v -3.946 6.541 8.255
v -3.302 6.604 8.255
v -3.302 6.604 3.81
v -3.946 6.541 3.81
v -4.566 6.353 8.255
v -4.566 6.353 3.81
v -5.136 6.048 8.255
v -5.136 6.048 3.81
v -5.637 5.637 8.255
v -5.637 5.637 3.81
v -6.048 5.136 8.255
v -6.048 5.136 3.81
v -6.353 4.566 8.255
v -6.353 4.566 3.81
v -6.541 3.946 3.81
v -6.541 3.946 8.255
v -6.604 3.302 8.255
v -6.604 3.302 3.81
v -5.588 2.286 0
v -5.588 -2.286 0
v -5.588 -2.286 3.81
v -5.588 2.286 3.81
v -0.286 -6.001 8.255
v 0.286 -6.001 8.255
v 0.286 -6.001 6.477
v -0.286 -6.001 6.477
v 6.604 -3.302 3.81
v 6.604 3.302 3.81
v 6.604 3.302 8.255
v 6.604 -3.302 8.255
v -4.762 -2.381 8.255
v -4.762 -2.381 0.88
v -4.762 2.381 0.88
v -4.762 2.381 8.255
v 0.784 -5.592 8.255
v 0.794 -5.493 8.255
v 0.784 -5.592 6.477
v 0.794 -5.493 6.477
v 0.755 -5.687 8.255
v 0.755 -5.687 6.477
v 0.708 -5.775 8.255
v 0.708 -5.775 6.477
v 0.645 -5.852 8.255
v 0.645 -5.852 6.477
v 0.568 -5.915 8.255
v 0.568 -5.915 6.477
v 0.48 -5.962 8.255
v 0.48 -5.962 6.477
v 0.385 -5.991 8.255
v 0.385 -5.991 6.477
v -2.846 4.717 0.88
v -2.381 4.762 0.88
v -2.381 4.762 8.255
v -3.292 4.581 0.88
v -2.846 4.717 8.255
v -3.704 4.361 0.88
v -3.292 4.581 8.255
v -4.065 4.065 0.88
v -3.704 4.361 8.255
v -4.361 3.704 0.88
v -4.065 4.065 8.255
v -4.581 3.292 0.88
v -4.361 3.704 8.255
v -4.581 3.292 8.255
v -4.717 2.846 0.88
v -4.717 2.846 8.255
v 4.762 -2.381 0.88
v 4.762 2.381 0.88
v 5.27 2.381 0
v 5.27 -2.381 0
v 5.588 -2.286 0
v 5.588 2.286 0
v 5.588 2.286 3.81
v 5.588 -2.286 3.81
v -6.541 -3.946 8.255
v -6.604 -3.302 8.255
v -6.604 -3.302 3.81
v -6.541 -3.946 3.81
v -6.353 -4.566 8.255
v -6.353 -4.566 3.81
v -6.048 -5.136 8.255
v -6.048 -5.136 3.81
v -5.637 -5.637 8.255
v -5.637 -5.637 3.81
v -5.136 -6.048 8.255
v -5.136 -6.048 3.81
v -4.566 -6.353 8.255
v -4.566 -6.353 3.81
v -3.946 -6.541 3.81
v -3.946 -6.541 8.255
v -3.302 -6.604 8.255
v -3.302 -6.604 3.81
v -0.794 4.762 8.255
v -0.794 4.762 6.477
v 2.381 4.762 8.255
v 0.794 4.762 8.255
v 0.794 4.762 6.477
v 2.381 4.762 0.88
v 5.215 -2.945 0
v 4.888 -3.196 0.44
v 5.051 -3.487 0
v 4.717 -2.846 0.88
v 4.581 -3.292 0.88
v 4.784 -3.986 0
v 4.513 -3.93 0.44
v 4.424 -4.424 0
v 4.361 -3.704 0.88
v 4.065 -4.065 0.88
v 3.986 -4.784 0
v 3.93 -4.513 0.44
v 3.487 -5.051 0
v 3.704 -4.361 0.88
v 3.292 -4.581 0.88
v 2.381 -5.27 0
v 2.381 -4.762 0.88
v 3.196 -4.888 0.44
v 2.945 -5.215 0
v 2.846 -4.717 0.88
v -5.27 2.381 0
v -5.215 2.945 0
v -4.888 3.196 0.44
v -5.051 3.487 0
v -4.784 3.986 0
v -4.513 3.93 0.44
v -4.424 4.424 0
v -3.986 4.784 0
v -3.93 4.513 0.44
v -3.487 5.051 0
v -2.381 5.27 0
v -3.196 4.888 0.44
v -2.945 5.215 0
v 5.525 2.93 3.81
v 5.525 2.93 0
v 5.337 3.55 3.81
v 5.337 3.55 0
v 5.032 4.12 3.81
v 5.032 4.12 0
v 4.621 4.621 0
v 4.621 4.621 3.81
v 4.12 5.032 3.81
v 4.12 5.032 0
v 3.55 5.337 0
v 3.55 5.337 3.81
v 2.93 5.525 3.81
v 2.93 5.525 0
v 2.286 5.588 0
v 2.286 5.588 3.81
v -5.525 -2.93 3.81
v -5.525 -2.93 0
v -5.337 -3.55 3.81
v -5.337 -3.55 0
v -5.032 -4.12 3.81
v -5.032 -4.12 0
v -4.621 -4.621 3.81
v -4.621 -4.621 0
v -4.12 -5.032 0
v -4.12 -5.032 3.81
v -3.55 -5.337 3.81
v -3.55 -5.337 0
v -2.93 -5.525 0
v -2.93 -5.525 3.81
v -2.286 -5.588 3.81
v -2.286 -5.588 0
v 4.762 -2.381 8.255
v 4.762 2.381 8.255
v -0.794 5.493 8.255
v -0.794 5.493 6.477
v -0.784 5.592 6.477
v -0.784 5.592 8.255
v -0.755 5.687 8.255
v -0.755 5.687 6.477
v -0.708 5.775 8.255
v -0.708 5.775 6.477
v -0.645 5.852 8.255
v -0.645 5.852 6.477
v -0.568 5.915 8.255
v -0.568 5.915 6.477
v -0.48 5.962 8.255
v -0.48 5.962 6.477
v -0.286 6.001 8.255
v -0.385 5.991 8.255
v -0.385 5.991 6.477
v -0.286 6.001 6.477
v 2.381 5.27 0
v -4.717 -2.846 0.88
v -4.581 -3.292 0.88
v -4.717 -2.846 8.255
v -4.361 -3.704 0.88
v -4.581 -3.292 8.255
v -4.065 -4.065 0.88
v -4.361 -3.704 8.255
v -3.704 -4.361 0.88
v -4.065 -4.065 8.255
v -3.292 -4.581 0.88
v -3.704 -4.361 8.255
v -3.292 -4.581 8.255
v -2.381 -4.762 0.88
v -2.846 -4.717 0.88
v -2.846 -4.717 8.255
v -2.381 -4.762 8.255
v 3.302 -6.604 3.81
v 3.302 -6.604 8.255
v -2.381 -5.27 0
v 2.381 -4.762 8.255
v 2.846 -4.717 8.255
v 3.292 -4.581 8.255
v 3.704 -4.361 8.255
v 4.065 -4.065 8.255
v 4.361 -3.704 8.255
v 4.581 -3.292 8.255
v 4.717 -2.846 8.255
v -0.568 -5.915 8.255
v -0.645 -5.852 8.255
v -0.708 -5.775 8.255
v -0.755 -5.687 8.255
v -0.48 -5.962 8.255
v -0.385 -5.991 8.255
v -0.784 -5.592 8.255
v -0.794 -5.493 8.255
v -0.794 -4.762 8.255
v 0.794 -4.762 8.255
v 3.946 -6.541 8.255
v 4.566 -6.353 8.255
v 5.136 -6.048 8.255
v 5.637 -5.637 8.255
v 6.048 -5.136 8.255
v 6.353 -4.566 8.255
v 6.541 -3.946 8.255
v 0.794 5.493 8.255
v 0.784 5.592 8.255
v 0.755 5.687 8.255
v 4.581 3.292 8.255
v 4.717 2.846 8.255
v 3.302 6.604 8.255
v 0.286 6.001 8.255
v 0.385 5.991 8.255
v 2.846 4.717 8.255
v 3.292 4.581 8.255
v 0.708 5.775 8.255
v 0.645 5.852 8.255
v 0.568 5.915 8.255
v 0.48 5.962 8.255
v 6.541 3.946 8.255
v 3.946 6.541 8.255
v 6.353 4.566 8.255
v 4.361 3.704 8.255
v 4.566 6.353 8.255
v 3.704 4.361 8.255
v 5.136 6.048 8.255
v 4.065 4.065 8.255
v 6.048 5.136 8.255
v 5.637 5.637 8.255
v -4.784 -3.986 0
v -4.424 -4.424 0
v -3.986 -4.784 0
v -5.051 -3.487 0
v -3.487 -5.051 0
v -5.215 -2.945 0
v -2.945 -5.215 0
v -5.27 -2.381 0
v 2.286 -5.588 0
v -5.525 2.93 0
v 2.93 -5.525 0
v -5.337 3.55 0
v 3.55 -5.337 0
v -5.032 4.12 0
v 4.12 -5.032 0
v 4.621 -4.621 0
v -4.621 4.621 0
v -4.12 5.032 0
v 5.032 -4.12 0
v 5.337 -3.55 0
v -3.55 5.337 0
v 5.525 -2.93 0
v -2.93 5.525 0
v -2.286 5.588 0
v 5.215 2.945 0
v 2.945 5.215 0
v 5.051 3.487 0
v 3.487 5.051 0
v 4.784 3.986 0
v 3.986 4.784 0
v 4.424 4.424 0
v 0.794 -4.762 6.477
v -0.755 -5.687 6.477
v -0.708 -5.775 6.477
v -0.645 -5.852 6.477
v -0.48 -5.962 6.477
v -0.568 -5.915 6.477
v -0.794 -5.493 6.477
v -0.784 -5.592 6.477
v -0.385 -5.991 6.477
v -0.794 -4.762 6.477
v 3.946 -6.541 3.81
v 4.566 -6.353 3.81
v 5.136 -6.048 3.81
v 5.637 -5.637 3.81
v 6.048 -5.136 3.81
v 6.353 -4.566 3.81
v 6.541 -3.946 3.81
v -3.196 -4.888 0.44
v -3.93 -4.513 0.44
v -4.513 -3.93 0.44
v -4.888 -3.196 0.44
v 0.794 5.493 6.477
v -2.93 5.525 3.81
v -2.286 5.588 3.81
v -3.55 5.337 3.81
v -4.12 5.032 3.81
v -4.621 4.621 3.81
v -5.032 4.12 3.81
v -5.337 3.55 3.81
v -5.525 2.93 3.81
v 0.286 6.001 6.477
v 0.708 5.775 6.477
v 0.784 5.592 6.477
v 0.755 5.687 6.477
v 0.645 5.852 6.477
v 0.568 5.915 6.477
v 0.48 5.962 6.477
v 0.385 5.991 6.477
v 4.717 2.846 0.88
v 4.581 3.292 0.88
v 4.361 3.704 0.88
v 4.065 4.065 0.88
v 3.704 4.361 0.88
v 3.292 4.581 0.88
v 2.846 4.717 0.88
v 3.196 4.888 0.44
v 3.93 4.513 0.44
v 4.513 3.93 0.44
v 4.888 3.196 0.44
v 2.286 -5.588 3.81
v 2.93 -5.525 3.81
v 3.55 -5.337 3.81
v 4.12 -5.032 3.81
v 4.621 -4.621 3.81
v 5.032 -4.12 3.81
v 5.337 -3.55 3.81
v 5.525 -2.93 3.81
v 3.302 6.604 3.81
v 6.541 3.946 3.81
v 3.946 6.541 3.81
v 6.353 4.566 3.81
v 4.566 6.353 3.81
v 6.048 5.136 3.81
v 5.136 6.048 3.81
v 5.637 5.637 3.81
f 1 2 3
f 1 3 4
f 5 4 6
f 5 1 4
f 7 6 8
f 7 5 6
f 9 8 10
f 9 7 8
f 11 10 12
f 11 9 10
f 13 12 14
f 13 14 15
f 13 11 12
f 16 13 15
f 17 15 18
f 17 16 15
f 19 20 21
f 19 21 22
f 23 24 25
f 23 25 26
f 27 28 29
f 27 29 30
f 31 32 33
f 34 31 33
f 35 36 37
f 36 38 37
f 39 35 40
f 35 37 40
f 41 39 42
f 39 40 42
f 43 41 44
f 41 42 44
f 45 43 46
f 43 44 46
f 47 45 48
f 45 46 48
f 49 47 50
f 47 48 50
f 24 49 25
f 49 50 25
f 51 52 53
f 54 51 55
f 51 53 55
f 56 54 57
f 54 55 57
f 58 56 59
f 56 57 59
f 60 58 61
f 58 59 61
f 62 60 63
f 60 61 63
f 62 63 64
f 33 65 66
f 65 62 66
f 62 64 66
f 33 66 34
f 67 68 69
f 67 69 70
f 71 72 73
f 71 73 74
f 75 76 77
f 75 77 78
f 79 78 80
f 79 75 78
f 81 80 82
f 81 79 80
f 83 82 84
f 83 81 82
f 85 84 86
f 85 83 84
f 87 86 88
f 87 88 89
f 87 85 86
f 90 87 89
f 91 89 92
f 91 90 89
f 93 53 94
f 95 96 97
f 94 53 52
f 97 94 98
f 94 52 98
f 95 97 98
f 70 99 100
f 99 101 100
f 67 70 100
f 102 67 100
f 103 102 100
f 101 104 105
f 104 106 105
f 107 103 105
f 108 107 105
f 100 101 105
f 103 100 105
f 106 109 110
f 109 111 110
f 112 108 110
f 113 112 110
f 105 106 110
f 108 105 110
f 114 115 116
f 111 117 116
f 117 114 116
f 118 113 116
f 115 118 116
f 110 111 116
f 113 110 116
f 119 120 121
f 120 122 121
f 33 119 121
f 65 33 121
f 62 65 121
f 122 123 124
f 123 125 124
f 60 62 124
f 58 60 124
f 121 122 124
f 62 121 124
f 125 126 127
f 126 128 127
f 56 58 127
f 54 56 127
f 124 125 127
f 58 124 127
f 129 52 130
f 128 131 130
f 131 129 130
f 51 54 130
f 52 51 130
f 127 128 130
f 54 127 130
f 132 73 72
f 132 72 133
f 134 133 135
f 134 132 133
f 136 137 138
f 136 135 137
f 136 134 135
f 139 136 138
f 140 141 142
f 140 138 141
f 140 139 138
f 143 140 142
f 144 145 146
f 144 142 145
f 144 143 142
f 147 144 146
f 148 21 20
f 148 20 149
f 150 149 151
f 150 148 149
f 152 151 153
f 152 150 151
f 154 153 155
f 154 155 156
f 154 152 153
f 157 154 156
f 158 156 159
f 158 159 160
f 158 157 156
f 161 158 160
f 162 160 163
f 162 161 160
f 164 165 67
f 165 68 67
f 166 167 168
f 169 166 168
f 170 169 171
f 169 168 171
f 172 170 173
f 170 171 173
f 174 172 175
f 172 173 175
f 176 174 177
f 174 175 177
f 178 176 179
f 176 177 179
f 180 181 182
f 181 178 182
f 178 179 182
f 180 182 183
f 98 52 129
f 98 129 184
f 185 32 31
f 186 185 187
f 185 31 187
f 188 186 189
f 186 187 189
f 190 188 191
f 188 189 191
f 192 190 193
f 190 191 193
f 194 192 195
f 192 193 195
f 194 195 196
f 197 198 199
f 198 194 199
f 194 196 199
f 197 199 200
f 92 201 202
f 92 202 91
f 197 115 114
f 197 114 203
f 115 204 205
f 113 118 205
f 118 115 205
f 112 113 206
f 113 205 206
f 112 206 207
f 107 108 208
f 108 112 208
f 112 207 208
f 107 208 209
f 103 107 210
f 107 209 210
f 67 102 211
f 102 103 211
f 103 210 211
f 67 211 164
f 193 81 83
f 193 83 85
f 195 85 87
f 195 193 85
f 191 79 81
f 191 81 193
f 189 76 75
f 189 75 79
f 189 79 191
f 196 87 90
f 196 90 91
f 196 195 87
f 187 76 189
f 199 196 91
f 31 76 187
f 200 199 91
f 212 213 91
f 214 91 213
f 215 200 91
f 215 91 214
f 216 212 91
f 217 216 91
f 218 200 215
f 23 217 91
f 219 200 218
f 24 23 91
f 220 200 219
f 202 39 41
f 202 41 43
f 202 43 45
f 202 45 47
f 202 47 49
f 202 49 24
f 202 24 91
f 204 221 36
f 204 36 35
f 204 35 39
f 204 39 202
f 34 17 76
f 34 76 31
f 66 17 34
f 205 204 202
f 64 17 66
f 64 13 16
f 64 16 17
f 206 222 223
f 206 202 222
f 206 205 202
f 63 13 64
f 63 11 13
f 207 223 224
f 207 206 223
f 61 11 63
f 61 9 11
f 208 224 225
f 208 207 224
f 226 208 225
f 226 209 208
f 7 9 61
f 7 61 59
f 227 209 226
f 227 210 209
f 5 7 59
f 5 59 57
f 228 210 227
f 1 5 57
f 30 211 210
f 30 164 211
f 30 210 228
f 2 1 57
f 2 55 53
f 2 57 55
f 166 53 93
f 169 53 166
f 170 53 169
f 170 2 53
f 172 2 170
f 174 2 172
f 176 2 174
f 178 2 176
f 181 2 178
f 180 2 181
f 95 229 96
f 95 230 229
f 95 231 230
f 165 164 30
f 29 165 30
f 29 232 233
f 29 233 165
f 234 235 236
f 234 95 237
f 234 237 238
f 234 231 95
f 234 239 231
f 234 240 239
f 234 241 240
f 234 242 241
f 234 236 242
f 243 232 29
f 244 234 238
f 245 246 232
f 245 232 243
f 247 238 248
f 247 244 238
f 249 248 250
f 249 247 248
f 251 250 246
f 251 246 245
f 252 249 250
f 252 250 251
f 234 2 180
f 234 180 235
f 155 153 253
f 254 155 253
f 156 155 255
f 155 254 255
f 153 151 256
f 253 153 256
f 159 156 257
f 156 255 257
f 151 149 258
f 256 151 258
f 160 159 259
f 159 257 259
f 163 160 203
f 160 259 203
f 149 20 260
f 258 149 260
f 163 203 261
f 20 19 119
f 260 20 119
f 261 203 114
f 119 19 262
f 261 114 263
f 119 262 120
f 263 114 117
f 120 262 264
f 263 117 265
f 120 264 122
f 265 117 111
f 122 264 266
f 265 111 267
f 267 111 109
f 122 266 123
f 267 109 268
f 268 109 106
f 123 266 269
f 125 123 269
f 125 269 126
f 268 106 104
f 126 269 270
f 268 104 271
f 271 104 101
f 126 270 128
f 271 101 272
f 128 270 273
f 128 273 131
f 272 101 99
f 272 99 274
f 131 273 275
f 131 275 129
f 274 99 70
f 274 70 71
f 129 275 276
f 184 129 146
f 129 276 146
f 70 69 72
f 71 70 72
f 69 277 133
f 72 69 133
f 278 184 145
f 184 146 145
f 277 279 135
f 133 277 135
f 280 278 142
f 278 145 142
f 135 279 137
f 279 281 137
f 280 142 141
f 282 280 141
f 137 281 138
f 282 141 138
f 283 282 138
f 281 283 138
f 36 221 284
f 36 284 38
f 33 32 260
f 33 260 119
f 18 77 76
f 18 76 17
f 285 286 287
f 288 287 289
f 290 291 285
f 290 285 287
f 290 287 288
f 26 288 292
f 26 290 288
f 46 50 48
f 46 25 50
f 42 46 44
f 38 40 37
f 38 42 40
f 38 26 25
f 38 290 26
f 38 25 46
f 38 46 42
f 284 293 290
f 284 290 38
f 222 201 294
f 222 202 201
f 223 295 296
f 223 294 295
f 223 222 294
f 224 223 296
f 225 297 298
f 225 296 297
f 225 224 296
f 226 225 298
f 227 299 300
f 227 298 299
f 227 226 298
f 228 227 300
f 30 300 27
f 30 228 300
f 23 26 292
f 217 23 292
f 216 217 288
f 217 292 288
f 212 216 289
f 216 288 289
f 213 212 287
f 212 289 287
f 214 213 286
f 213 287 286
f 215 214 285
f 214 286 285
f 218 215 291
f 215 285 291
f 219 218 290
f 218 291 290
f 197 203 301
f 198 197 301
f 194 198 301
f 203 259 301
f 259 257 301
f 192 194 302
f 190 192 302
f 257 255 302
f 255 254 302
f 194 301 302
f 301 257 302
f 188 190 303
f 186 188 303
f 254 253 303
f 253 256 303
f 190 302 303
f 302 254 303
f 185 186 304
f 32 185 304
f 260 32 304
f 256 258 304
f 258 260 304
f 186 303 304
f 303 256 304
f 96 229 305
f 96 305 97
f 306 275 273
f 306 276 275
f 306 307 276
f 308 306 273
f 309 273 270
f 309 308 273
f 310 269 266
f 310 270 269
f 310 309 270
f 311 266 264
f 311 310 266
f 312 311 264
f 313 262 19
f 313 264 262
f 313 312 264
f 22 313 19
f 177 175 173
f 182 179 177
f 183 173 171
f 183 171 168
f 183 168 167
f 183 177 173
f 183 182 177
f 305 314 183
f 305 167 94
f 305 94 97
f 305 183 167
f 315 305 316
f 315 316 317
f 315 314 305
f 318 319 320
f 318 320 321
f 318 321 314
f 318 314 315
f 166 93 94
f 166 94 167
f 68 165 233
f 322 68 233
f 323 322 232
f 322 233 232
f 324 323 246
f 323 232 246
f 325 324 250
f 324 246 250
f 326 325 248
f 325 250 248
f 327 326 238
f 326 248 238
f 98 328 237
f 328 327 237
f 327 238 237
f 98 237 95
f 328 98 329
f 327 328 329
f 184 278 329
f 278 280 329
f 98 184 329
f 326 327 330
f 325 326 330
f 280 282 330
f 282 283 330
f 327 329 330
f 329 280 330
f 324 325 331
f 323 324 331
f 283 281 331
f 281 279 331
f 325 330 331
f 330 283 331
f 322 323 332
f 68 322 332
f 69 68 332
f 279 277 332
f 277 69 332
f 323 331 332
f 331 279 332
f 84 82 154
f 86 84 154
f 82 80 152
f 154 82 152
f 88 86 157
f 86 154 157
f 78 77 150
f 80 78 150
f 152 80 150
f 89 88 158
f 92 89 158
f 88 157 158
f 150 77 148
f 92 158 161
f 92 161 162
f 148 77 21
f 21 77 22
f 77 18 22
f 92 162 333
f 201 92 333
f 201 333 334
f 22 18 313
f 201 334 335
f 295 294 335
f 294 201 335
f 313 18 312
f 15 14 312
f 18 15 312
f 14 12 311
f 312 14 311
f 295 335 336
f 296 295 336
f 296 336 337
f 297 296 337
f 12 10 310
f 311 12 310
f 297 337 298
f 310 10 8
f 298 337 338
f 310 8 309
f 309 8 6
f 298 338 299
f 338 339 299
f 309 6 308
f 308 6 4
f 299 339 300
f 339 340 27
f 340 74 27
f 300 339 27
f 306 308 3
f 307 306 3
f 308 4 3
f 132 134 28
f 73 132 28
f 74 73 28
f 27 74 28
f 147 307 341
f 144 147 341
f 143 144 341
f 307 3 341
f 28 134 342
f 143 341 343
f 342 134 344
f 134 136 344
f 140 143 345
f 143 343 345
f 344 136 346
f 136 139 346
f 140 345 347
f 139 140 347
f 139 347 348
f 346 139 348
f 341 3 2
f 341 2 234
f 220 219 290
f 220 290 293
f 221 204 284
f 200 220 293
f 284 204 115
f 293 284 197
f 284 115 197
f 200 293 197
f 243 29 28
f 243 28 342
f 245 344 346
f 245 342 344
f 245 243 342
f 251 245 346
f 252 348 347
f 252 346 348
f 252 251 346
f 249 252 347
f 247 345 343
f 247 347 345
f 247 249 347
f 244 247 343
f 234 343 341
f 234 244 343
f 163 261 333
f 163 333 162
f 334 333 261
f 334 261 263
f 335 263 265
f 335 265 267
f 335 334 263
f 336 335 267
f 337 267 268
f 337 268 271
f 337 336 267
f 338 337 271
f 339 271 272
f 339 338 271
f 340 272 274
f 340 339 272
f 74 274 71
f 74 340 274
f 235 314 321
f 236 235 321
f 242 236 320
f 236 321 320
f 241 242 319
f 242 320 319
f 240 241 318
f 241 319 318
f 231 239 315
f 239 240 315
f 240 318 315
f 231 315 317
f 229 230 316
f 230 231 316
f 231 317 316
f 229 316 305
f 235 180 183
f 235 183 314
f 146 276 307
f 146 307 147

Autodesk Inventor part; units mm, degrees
ref_plane "YZ Plane" through (0, 0, 0) normal (1, 0, 0) x (0, 1, 0)
ref_plane "XZ Plane" through (0, 0, 0) normal (0, 1, 0) x (-1, 0, 0)
ref_plane "XY Plane" through (0, 0, 0) normal (0, 0, 1) x (1, 0, 0)
sketch "Sketch1" plane through (0, 0, 0) normal (0, 0, 1) x (1, 0, 0)
  line L0 (-7.8232, 0) -> (7.8232, 0) projected
  line L1 (0, 7.8232) -> (0, -7.8232) projected
  line L2 (-5.588, 5.588) -> (5.588, 5.588)
  line L3 (5.588, 5.588) -> (5.588, -5.588)
  line L4 (5.588, -5.588) -> (-5.588, -5.588)
  line L5 (-5.588, -5.588) -> (-5.588, 5.588)
  point P0 (0, 0)
  point P1 (-5.588, 0)
  point P2 (0, 5.588)
  dimension "d0" = 11.176
  dimension "d1" = 11.176
extrude "Extrusion1" add sketch "Sketch1" along normal blind 3.81
sketch "Sketch2" plane through (0, 0, 3.81) normal (0, 0, 1) x (1, 0, 0)
  line L0 (-6.604, 6.604) -> (6.604, 6.604)
  line L1 (6.604, 6.604) -> (6.604, -6.604)
  line L2 (6.604, -6.604) -> (-6.604, -6.604)
  line L3 (-6.604, -6.604) -> (-6.604, 6.604)
  point P0 (0, 0)
  point P1 (-6.604, 0)
  point P2 (0, 6.604)
  dimension "d4" = 13.208
  dimension "d5" = 13.208
extrude "Extrusion2" add sketch "Sketch2" along normal blind 4.445
sketch "Sketch3" plane through (0, 0, 0) normal (0, 0, 1) x (1, 0, 0)
  line L0 (-4.7625, 4.7625) -> (4.7625, 4.7625)
  line L1 (4.7625, 4.7625) -> (4.7625, -4.7625)
  line L2 (4.7625, -4.7625) -> (-4.7625, -4.7625)
  line L3 (-4.7625, -4.7625) -> (-4.7625, 4.7625)
  point P0 (0, 0)
  point P1 (-4.7625, 0)
  point P2 (0, 4.7625)
  dimension "d8" = 9.525
  dimension "d9" = 9.525
extrude "Extrusion3" cut sketch "Sketch3" along normal through all
sketch "Sketch4" plane through (0, 0, 8.255) normal (0, 0, 1) x (1, 0, 0)
  line L0 (-0.7937, 6.0008) -> (0.7937, 6.0008)
  line L1 (0.7937, 6.0008) -> (0.7937, -6.0008)
  line L2 (0.7937, -6.0008) -> (-0.7937, -6.0008)
  line L3 (-0.7937, -6.0008) -> (-0.7937, 6.0008)
  point P0 (0, 0)
  point P1 (-0.7938, 0)
  point P2 (0, 6.0008)
  dimension "d14" = 12.0015
  dimension "d15" = 1.5875
extrude "Extrusion4" cut sketch "Sketch4" against normal blind 1.778
fillet "Fillet1" radius 2.3813 4 edges at (-4.7625, 4.7625, 4.1275) (4.7625, 4.7625, 4.1275) (4.7625, -4.7625, 4.1275) (-4.7625, -4.7625, 4.1275)
fillet "Fillet2" radius 3.302 8 edges at (-5.588, -5.588, 1.905) (-5.588, 5.588, 1.905) (5.588, -5.588, 1.905) (5.588, 5.588, 1.905) (-6.604, 6.604, 6.0325) (-6.604, -6.604, 6.0325) (6.604, -6.604, 6.0325) (6.604, 6.604, 6.0325)
fillet "Fillet3" radius 0.508 4 edges at (0.7937, 6.0008, 7.366) (-0.7937, 6.0008, 7.366) (-0.7937, -6.0008, 7.366) (0.7937, -6.0008, 7.366)
chamfer "Chamfer1" distance 0.508 angle 60 8 edges at (4.065, 4.065, 0) (4.7625, 0, 0) (4.065, -4.065, 0) (0, -4.7625, 0) (-4.065, -4.065, 0) (-4.7625, 0, 0) (-4.065, 4.065, 0) (0, 4.7625, 0) measured on face at (0.762, 5.0377, 0)
equation "\"d9\" = d8"
properties part number "J002873" material "ALUMINUM, 6061-T651"
